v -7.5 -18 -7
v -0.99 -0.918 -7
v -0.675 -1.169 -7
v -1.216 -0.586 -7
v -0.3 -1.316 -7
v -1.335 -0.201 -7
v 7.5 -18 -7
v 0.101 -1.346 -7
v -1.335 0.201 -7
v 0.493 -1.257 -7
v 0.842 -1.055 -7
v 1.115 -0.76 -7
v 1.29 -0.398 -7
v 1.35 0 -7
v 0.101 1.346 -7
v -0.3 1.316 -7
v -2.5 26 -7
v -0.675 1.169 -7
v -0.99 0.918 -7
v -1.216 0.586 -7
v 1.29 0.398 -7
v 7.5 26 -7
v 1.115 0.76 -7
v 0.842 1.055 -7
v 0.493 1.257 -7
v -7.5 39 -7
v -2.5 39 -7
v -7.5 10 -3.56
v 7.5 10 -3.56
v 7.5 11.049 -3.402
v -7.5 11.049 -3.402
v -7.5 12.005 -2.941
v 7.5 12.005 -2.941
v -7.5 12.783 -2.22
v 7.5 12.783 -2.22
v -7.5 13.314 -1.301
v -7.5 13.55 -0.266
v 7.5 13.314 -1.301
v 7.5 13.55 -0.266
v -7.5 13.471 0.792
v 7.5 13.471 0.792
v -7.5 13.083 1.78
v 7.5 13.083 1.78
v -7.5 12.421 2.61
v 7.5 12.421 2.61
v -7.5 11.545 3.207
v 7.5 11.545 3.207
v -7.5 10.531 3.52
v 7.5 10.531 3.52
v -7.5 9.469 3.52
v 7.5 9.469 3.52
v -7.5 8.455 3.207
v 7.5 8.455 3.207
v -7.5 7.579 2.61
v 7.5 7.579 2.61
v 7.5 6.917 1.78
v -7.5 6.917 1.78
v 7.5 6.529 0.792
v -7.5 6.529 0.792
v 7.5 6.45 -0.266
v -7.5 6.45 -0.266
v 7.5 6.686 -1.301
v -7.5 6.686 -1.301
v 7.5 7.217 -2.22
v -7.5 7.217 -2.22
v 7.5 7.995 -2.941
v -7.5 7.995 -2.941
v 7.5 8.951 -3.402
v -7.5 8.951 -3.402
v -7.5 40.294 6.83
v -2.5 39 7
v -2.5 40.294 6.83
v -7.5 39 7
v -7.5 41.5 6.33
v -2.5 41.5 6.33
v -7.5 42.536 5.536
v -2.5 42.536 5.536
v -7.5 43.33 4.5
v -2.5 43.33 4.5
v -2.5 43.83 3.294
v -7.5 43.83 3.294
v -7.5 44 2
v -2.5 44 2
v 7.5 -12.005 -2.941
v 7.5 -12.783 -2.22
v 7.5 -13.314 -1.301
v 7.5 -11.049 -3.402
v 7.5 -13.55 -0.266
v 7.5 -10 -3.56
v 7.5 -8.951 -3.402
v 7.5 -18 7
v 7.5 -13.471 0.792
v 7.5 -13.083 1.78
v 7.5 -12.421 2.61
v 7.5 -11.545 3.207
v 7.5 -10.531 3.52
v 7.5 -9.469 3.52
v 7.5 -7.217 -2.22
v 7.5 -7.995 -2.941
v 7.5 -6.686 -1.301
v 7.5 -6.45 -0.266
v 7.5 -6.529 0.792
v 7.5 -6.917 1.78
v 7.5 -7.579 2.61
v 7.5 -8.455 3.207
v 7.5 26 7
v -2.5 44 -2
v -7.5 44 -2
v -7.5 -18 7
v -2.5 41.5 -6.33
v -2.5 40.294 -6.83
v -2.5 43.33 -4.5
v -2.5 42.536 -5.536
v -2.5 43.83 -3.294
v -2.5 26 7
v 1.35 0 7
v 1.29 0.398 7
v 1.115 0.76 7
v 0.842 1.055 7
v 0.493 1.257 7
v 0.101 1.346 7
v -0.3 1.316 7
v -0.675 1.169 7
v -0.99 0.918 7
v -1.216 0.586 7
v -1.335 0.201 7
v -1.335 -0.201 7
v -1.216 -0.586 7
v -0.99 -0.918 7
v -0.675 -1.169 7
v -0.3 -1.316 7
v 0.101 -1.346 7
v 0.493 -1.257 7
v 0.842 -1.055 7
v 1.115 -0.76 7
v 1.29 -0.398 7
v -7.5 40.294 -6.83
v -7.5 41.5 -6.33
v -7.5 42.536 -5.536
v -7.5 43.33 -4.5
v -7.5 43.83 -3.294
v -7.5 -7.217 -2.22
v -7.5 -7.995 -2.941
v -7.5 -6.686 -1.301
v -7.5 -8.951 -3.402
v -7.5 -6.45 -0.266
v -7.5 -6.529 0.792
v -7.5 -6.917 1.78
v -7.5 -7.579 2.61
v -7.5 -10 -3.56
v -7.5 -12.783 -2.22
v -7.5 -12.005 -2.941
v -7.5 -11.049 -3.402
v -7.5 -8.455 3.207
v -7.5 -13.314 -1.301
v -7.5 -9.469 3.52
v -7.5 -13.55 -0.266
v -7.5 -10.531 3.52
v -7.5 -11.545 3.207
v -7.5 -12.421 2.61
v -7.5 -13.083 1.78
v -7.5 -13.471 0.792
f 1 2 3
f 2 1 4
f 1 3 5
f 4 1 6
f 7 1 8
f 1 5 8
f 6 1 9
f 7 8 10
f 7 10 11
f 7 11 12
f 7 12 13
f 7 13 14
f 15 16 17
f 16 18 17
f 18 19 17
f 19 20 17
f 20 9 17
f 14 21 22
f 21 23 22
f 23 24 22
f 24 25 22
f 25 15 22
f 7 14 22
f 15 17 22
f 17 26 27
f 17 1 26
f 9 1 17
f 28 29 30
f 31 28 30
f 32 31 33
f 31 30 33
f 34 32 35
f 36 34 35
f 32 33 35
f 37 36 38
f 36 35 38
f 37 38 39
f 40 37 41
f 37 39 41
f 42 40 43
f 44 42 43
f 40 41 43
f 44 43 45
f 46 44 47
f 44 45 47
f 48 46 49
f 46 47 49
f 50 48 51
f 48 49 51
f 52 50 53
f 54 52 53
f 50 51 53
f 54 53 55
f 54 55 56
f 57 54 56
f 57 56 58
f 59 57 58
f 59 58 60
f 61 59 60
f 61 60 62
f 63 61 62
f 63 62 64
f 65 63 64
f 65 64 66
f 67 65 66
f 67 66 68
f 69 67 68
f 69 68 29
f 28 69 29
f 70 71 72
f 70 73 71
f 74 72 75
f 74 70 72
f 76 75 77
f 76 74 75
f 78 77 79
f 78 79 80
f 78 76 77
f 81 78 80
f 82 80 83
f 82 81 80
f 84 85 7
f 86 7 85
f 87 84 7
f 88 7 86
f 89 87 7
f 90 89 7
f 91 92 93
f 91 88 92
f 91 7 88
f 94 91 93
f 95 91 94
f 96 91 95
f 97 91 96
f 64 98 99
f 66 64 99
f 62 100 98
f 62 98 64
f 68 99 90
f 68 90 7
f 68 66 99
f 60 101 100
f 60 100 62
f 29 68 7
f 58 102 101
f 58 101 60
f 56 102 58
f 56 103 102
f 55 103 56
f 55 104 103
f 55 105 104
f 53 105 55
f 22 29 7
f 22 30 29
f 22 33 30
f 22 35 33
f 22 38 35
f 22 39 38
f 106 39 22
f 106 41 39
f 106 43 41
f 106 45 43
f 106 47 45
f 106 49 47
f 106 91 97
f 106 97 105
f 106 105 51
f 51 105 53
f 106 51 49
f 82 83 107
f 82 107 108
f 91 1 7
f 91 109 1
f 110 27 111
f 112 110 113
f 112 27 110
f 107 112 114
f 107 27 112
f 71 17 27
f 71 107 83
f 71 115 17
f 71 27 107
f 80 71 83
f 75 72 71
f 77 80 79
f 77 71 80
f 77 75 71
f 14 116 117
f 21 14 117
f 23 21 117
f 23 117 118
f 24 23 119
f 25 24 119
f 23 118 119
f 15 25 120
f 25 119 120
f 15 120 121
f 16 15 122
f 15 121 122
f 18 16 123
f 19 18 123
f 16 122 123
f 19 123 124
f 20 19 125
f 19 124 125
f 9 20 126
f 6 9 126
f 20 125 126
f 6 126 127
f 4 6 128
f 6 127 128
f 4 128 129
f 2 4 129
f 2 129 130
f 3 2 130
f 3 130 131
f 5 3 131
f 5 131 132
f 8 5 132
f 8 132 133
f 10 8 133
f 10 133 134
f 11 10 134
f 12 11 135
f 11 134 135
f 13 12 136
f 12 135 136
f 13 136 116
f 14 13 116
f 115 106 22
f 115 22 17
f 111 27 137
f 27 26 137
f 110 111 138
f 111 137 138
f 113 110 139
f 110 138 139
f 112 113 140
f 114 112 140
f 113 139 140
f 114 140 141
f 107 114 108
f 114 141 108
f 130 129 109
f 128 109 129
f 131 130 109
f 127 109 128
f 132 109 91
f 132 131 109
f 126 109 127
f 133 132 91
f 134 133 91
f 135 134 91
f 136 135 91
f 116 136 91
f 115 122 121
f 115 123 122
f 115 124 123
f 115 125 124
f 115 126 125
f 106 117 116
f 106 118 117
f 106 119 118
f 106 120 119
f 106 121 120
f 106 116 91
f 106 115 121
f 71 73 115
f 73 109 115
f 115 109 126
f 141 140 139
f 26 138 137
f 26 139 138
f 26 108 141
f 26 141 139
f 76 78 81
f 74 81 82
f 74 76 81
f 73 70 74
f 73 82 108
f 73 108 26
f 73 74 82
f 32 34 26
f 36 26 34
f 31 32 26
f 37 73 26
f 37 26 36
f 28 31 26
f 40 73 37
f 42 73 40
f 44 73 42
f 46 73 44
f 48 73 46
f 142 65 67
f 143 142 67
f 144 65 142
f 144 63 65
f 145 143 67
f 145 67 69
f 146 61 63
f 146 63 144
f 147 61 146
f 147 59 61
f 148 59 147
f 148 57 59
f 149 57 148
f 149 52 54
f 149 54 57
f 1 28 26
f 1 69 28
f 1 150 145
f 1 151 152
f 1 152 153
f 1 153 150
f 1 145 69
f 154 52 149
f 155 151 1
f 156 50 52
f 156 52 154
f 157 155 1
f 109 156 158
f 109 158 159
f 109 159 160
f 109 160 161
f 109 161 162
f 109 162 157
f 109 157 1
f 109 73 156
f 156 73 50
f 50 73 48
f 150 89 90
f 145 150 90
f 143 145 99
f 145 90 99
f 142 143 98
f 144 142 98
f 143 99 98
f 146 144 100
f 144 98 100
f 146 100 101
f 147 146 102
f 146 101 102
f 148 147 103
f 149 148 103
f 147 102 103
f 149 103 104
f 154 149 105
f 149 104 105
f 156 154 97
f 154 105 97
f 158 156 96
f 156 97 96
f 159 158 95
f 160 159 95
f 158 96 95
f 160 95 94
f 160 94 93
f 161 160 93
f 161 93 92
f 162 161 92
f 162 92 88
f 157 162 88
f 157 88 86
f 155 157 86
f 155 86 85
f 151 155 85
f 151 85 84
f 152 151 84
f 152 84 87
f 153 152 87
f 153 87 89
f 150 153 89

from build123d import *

# Parameters (mm, degrees)
EXTRUDE_1_DEPTH     = 7
SKETCH_3_R          = 3.56
CUT_EXTRUDE_1_DEPTH = 20
SKETCH_4_R          = 1.35
CUT_EXTRUDE_2_DEPTH = 14
FILLET_1_R          = 5


with BuildPart() as part:
    # 草图1 → 凸台-拉伸1 (new, symmetric)
    with BuildSketch(Plane.XY):
        Polygon((-7.5, -18), (7.5, -18), (7.5, 23), (7.5, 26), (-2.5, 26), (-2.5, 44), (-7.5, 44), (-7.5, 26), (-7.5, 21), align=None)
    extrude(amount=EXTRUDE_1_DEPTH, both=True)

    # 草图3 → 切除-拉伸1 (cut)
    with BuildSketch(Plane(origin=(7.5, 0, 0), x_dir=(0, 0, -1), z_dir=(1, 0, 0))):
        with Locations((0, -10)):
            Circle(SKETCH_3_R)
        with Locations((0, 10)):
            Circle(SKETCH_3_R)
    extrude(amount=-CUT_EXTRUDE_1_DEPTH, mode=Mode.SUBTRACT)

    # 草图4 → 切除-拉伸2 (cut)
    with BuildSketch(Plane.XY.offset(7)):
        Circle(SKETCH_4_R)
    extrude(amount=-CUT_EXTRUDE_2_DEPTH, mode=Mode.SUBTRACT)

    # 圆角1
    fillet_1_edges = [part.edges().sort_by_distance(p)[0] for p in [
        (-5, 44, 7),
        (-5, 44, -7),
    ]]
    fillet(fillet_1_edges, radius=FILLET_1_R)


solid = part.part
